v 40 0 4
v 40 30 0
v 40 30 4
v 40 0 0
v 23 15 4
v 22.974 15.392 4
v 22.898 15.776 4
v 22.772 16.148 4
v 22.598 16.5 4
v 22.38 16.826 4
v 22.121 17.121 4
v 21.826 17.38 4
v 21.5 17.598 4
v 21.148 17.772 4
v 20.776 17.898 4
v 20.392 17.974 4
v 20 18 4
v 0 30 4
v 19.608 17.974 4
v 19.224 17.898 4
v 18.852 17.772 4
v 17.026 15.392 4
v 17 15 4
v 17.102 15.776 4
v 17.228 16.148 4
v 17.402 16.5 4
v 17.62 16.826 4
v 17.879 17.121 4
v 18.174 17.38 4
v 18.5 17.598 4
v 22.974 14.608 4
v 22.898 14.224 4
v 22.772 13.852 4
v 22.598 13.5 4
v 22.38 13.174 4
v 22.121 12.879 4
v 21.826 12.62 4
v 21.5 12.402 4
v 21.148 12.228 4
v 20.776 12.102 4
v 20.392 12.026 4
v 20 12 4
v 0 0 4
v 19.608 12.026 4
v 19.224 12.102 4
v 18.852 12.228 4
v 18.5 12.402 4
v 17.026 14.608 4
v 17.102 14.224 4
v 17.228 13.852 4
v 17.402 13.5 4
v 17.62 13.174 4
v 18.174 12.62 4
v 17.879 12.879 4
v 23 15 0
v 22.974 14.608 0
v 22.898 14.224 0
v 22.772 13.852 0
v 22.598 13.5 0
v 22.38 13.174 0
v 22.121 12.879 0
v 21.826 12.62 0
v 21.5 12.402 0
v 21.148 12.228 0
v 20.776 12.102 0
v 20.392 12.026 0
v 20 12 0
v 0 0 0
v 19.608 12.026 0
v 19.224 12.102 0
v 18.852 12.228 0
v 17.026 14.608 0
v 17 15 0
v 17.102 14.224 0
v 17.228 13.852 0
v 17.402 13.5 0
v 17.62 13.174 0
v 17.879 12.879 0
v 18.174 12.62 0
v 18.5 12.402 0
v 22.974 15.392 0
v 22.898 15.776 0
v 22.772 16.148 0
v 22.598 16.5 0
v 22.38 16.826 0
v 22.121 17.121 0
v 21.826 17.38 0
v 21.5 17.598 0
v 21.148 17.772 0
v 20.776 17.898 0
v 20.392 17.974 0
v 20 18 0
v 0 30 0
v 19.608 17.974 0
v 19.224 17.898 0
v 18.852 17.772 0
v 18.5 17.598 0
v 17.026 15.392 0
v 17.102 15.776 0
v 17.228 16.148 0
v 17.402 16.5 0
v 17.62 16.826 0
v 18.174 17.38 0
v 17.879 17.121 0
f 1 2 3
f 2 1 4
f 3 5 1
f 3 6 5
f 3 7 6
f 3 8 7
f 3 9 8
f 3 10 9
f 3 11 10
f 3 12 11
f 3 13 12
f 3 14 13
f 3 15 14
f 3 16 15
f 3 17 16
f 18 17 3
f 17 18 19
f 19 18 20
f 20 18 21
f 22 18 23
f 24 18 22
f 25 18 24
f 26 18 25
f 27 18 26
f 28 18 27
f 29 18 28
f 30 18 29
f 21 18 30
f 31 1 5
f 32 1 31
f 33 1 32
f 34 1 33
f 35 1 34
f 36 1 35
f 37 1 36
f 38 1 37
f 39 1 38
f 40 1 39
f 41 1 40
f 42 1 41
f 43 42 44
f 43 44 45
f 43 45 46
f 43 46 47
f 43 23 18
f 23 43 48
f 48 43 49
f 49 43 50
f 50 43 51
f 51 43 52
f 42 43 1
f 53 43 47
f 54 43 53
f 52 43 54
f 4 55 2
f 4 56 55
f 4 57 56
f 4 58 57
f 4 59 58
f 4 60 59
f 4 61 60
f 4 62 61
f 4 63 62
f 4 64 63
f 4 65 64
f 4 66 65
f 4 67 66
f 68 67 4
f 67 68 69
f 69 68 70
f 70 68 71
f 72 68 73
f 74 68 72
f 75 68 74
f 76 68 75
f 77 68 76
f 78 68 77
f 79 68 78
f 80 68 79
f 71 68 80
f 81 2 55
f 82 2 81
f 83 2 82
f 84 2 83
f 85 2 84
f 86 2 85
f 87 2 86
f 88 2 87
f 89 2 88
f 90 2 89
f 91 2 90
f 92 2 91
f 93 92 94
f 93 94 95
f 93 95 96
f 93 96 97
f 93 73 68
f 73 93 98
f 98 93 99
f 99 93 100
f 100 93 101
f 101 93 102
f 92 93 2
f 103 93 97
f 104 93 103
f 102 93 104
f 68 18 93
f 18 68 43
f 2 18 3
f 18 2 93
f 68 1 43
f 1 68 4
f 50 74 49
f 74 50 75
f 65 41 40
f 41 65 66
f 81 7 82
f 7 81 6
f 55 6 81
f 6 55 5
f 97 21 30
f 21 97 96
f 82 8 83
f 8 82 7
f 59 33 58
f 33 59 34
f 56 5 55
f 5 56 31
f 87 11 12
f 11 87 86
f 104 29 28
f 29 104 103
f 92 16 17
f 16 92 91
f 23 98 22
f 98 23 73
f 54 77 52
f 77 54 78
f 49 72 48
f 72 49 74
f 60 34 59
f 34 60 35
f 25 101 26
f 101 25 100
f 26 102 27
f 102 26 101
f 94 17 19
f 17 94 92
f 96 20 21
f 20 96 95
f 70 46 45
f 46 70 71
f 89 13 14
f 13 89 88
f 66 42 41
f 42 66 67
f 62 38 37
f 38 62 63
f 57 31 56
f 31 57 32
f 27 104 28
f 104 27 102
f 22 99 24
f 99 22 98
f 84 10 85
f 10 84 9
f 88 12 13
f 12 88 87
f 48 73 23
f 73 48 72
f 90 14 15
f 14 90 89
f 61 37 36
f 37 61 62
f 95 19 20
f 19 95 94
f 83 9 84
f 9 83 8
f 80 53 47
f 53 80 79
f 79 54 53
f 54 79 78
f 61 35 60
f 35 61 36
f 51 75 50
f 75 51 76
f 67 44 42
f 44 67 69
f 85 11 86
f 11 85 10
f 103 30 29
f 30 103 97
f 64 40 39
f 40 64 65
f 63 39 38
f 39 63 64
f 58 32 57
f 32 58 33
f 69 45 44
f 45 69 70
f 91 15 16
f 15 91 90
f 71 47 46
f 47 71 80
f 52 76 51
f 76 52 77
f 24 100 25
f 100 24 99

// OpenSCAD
plate_w = 40;
plate_d = 30;
plate_t = 4;
bore_d = 6;
facets = 48;

module plate() {
    cube([plate_w, plate_d, plate_t]);
}

module bore(x, y) {
    translate([x, y, -1]) cylinder(d = bore_d, h = plate_t + 2, $fn = facets);
}

difference() {
    plate();
    bore(plate_w / 2, plate_d / 2);
}
